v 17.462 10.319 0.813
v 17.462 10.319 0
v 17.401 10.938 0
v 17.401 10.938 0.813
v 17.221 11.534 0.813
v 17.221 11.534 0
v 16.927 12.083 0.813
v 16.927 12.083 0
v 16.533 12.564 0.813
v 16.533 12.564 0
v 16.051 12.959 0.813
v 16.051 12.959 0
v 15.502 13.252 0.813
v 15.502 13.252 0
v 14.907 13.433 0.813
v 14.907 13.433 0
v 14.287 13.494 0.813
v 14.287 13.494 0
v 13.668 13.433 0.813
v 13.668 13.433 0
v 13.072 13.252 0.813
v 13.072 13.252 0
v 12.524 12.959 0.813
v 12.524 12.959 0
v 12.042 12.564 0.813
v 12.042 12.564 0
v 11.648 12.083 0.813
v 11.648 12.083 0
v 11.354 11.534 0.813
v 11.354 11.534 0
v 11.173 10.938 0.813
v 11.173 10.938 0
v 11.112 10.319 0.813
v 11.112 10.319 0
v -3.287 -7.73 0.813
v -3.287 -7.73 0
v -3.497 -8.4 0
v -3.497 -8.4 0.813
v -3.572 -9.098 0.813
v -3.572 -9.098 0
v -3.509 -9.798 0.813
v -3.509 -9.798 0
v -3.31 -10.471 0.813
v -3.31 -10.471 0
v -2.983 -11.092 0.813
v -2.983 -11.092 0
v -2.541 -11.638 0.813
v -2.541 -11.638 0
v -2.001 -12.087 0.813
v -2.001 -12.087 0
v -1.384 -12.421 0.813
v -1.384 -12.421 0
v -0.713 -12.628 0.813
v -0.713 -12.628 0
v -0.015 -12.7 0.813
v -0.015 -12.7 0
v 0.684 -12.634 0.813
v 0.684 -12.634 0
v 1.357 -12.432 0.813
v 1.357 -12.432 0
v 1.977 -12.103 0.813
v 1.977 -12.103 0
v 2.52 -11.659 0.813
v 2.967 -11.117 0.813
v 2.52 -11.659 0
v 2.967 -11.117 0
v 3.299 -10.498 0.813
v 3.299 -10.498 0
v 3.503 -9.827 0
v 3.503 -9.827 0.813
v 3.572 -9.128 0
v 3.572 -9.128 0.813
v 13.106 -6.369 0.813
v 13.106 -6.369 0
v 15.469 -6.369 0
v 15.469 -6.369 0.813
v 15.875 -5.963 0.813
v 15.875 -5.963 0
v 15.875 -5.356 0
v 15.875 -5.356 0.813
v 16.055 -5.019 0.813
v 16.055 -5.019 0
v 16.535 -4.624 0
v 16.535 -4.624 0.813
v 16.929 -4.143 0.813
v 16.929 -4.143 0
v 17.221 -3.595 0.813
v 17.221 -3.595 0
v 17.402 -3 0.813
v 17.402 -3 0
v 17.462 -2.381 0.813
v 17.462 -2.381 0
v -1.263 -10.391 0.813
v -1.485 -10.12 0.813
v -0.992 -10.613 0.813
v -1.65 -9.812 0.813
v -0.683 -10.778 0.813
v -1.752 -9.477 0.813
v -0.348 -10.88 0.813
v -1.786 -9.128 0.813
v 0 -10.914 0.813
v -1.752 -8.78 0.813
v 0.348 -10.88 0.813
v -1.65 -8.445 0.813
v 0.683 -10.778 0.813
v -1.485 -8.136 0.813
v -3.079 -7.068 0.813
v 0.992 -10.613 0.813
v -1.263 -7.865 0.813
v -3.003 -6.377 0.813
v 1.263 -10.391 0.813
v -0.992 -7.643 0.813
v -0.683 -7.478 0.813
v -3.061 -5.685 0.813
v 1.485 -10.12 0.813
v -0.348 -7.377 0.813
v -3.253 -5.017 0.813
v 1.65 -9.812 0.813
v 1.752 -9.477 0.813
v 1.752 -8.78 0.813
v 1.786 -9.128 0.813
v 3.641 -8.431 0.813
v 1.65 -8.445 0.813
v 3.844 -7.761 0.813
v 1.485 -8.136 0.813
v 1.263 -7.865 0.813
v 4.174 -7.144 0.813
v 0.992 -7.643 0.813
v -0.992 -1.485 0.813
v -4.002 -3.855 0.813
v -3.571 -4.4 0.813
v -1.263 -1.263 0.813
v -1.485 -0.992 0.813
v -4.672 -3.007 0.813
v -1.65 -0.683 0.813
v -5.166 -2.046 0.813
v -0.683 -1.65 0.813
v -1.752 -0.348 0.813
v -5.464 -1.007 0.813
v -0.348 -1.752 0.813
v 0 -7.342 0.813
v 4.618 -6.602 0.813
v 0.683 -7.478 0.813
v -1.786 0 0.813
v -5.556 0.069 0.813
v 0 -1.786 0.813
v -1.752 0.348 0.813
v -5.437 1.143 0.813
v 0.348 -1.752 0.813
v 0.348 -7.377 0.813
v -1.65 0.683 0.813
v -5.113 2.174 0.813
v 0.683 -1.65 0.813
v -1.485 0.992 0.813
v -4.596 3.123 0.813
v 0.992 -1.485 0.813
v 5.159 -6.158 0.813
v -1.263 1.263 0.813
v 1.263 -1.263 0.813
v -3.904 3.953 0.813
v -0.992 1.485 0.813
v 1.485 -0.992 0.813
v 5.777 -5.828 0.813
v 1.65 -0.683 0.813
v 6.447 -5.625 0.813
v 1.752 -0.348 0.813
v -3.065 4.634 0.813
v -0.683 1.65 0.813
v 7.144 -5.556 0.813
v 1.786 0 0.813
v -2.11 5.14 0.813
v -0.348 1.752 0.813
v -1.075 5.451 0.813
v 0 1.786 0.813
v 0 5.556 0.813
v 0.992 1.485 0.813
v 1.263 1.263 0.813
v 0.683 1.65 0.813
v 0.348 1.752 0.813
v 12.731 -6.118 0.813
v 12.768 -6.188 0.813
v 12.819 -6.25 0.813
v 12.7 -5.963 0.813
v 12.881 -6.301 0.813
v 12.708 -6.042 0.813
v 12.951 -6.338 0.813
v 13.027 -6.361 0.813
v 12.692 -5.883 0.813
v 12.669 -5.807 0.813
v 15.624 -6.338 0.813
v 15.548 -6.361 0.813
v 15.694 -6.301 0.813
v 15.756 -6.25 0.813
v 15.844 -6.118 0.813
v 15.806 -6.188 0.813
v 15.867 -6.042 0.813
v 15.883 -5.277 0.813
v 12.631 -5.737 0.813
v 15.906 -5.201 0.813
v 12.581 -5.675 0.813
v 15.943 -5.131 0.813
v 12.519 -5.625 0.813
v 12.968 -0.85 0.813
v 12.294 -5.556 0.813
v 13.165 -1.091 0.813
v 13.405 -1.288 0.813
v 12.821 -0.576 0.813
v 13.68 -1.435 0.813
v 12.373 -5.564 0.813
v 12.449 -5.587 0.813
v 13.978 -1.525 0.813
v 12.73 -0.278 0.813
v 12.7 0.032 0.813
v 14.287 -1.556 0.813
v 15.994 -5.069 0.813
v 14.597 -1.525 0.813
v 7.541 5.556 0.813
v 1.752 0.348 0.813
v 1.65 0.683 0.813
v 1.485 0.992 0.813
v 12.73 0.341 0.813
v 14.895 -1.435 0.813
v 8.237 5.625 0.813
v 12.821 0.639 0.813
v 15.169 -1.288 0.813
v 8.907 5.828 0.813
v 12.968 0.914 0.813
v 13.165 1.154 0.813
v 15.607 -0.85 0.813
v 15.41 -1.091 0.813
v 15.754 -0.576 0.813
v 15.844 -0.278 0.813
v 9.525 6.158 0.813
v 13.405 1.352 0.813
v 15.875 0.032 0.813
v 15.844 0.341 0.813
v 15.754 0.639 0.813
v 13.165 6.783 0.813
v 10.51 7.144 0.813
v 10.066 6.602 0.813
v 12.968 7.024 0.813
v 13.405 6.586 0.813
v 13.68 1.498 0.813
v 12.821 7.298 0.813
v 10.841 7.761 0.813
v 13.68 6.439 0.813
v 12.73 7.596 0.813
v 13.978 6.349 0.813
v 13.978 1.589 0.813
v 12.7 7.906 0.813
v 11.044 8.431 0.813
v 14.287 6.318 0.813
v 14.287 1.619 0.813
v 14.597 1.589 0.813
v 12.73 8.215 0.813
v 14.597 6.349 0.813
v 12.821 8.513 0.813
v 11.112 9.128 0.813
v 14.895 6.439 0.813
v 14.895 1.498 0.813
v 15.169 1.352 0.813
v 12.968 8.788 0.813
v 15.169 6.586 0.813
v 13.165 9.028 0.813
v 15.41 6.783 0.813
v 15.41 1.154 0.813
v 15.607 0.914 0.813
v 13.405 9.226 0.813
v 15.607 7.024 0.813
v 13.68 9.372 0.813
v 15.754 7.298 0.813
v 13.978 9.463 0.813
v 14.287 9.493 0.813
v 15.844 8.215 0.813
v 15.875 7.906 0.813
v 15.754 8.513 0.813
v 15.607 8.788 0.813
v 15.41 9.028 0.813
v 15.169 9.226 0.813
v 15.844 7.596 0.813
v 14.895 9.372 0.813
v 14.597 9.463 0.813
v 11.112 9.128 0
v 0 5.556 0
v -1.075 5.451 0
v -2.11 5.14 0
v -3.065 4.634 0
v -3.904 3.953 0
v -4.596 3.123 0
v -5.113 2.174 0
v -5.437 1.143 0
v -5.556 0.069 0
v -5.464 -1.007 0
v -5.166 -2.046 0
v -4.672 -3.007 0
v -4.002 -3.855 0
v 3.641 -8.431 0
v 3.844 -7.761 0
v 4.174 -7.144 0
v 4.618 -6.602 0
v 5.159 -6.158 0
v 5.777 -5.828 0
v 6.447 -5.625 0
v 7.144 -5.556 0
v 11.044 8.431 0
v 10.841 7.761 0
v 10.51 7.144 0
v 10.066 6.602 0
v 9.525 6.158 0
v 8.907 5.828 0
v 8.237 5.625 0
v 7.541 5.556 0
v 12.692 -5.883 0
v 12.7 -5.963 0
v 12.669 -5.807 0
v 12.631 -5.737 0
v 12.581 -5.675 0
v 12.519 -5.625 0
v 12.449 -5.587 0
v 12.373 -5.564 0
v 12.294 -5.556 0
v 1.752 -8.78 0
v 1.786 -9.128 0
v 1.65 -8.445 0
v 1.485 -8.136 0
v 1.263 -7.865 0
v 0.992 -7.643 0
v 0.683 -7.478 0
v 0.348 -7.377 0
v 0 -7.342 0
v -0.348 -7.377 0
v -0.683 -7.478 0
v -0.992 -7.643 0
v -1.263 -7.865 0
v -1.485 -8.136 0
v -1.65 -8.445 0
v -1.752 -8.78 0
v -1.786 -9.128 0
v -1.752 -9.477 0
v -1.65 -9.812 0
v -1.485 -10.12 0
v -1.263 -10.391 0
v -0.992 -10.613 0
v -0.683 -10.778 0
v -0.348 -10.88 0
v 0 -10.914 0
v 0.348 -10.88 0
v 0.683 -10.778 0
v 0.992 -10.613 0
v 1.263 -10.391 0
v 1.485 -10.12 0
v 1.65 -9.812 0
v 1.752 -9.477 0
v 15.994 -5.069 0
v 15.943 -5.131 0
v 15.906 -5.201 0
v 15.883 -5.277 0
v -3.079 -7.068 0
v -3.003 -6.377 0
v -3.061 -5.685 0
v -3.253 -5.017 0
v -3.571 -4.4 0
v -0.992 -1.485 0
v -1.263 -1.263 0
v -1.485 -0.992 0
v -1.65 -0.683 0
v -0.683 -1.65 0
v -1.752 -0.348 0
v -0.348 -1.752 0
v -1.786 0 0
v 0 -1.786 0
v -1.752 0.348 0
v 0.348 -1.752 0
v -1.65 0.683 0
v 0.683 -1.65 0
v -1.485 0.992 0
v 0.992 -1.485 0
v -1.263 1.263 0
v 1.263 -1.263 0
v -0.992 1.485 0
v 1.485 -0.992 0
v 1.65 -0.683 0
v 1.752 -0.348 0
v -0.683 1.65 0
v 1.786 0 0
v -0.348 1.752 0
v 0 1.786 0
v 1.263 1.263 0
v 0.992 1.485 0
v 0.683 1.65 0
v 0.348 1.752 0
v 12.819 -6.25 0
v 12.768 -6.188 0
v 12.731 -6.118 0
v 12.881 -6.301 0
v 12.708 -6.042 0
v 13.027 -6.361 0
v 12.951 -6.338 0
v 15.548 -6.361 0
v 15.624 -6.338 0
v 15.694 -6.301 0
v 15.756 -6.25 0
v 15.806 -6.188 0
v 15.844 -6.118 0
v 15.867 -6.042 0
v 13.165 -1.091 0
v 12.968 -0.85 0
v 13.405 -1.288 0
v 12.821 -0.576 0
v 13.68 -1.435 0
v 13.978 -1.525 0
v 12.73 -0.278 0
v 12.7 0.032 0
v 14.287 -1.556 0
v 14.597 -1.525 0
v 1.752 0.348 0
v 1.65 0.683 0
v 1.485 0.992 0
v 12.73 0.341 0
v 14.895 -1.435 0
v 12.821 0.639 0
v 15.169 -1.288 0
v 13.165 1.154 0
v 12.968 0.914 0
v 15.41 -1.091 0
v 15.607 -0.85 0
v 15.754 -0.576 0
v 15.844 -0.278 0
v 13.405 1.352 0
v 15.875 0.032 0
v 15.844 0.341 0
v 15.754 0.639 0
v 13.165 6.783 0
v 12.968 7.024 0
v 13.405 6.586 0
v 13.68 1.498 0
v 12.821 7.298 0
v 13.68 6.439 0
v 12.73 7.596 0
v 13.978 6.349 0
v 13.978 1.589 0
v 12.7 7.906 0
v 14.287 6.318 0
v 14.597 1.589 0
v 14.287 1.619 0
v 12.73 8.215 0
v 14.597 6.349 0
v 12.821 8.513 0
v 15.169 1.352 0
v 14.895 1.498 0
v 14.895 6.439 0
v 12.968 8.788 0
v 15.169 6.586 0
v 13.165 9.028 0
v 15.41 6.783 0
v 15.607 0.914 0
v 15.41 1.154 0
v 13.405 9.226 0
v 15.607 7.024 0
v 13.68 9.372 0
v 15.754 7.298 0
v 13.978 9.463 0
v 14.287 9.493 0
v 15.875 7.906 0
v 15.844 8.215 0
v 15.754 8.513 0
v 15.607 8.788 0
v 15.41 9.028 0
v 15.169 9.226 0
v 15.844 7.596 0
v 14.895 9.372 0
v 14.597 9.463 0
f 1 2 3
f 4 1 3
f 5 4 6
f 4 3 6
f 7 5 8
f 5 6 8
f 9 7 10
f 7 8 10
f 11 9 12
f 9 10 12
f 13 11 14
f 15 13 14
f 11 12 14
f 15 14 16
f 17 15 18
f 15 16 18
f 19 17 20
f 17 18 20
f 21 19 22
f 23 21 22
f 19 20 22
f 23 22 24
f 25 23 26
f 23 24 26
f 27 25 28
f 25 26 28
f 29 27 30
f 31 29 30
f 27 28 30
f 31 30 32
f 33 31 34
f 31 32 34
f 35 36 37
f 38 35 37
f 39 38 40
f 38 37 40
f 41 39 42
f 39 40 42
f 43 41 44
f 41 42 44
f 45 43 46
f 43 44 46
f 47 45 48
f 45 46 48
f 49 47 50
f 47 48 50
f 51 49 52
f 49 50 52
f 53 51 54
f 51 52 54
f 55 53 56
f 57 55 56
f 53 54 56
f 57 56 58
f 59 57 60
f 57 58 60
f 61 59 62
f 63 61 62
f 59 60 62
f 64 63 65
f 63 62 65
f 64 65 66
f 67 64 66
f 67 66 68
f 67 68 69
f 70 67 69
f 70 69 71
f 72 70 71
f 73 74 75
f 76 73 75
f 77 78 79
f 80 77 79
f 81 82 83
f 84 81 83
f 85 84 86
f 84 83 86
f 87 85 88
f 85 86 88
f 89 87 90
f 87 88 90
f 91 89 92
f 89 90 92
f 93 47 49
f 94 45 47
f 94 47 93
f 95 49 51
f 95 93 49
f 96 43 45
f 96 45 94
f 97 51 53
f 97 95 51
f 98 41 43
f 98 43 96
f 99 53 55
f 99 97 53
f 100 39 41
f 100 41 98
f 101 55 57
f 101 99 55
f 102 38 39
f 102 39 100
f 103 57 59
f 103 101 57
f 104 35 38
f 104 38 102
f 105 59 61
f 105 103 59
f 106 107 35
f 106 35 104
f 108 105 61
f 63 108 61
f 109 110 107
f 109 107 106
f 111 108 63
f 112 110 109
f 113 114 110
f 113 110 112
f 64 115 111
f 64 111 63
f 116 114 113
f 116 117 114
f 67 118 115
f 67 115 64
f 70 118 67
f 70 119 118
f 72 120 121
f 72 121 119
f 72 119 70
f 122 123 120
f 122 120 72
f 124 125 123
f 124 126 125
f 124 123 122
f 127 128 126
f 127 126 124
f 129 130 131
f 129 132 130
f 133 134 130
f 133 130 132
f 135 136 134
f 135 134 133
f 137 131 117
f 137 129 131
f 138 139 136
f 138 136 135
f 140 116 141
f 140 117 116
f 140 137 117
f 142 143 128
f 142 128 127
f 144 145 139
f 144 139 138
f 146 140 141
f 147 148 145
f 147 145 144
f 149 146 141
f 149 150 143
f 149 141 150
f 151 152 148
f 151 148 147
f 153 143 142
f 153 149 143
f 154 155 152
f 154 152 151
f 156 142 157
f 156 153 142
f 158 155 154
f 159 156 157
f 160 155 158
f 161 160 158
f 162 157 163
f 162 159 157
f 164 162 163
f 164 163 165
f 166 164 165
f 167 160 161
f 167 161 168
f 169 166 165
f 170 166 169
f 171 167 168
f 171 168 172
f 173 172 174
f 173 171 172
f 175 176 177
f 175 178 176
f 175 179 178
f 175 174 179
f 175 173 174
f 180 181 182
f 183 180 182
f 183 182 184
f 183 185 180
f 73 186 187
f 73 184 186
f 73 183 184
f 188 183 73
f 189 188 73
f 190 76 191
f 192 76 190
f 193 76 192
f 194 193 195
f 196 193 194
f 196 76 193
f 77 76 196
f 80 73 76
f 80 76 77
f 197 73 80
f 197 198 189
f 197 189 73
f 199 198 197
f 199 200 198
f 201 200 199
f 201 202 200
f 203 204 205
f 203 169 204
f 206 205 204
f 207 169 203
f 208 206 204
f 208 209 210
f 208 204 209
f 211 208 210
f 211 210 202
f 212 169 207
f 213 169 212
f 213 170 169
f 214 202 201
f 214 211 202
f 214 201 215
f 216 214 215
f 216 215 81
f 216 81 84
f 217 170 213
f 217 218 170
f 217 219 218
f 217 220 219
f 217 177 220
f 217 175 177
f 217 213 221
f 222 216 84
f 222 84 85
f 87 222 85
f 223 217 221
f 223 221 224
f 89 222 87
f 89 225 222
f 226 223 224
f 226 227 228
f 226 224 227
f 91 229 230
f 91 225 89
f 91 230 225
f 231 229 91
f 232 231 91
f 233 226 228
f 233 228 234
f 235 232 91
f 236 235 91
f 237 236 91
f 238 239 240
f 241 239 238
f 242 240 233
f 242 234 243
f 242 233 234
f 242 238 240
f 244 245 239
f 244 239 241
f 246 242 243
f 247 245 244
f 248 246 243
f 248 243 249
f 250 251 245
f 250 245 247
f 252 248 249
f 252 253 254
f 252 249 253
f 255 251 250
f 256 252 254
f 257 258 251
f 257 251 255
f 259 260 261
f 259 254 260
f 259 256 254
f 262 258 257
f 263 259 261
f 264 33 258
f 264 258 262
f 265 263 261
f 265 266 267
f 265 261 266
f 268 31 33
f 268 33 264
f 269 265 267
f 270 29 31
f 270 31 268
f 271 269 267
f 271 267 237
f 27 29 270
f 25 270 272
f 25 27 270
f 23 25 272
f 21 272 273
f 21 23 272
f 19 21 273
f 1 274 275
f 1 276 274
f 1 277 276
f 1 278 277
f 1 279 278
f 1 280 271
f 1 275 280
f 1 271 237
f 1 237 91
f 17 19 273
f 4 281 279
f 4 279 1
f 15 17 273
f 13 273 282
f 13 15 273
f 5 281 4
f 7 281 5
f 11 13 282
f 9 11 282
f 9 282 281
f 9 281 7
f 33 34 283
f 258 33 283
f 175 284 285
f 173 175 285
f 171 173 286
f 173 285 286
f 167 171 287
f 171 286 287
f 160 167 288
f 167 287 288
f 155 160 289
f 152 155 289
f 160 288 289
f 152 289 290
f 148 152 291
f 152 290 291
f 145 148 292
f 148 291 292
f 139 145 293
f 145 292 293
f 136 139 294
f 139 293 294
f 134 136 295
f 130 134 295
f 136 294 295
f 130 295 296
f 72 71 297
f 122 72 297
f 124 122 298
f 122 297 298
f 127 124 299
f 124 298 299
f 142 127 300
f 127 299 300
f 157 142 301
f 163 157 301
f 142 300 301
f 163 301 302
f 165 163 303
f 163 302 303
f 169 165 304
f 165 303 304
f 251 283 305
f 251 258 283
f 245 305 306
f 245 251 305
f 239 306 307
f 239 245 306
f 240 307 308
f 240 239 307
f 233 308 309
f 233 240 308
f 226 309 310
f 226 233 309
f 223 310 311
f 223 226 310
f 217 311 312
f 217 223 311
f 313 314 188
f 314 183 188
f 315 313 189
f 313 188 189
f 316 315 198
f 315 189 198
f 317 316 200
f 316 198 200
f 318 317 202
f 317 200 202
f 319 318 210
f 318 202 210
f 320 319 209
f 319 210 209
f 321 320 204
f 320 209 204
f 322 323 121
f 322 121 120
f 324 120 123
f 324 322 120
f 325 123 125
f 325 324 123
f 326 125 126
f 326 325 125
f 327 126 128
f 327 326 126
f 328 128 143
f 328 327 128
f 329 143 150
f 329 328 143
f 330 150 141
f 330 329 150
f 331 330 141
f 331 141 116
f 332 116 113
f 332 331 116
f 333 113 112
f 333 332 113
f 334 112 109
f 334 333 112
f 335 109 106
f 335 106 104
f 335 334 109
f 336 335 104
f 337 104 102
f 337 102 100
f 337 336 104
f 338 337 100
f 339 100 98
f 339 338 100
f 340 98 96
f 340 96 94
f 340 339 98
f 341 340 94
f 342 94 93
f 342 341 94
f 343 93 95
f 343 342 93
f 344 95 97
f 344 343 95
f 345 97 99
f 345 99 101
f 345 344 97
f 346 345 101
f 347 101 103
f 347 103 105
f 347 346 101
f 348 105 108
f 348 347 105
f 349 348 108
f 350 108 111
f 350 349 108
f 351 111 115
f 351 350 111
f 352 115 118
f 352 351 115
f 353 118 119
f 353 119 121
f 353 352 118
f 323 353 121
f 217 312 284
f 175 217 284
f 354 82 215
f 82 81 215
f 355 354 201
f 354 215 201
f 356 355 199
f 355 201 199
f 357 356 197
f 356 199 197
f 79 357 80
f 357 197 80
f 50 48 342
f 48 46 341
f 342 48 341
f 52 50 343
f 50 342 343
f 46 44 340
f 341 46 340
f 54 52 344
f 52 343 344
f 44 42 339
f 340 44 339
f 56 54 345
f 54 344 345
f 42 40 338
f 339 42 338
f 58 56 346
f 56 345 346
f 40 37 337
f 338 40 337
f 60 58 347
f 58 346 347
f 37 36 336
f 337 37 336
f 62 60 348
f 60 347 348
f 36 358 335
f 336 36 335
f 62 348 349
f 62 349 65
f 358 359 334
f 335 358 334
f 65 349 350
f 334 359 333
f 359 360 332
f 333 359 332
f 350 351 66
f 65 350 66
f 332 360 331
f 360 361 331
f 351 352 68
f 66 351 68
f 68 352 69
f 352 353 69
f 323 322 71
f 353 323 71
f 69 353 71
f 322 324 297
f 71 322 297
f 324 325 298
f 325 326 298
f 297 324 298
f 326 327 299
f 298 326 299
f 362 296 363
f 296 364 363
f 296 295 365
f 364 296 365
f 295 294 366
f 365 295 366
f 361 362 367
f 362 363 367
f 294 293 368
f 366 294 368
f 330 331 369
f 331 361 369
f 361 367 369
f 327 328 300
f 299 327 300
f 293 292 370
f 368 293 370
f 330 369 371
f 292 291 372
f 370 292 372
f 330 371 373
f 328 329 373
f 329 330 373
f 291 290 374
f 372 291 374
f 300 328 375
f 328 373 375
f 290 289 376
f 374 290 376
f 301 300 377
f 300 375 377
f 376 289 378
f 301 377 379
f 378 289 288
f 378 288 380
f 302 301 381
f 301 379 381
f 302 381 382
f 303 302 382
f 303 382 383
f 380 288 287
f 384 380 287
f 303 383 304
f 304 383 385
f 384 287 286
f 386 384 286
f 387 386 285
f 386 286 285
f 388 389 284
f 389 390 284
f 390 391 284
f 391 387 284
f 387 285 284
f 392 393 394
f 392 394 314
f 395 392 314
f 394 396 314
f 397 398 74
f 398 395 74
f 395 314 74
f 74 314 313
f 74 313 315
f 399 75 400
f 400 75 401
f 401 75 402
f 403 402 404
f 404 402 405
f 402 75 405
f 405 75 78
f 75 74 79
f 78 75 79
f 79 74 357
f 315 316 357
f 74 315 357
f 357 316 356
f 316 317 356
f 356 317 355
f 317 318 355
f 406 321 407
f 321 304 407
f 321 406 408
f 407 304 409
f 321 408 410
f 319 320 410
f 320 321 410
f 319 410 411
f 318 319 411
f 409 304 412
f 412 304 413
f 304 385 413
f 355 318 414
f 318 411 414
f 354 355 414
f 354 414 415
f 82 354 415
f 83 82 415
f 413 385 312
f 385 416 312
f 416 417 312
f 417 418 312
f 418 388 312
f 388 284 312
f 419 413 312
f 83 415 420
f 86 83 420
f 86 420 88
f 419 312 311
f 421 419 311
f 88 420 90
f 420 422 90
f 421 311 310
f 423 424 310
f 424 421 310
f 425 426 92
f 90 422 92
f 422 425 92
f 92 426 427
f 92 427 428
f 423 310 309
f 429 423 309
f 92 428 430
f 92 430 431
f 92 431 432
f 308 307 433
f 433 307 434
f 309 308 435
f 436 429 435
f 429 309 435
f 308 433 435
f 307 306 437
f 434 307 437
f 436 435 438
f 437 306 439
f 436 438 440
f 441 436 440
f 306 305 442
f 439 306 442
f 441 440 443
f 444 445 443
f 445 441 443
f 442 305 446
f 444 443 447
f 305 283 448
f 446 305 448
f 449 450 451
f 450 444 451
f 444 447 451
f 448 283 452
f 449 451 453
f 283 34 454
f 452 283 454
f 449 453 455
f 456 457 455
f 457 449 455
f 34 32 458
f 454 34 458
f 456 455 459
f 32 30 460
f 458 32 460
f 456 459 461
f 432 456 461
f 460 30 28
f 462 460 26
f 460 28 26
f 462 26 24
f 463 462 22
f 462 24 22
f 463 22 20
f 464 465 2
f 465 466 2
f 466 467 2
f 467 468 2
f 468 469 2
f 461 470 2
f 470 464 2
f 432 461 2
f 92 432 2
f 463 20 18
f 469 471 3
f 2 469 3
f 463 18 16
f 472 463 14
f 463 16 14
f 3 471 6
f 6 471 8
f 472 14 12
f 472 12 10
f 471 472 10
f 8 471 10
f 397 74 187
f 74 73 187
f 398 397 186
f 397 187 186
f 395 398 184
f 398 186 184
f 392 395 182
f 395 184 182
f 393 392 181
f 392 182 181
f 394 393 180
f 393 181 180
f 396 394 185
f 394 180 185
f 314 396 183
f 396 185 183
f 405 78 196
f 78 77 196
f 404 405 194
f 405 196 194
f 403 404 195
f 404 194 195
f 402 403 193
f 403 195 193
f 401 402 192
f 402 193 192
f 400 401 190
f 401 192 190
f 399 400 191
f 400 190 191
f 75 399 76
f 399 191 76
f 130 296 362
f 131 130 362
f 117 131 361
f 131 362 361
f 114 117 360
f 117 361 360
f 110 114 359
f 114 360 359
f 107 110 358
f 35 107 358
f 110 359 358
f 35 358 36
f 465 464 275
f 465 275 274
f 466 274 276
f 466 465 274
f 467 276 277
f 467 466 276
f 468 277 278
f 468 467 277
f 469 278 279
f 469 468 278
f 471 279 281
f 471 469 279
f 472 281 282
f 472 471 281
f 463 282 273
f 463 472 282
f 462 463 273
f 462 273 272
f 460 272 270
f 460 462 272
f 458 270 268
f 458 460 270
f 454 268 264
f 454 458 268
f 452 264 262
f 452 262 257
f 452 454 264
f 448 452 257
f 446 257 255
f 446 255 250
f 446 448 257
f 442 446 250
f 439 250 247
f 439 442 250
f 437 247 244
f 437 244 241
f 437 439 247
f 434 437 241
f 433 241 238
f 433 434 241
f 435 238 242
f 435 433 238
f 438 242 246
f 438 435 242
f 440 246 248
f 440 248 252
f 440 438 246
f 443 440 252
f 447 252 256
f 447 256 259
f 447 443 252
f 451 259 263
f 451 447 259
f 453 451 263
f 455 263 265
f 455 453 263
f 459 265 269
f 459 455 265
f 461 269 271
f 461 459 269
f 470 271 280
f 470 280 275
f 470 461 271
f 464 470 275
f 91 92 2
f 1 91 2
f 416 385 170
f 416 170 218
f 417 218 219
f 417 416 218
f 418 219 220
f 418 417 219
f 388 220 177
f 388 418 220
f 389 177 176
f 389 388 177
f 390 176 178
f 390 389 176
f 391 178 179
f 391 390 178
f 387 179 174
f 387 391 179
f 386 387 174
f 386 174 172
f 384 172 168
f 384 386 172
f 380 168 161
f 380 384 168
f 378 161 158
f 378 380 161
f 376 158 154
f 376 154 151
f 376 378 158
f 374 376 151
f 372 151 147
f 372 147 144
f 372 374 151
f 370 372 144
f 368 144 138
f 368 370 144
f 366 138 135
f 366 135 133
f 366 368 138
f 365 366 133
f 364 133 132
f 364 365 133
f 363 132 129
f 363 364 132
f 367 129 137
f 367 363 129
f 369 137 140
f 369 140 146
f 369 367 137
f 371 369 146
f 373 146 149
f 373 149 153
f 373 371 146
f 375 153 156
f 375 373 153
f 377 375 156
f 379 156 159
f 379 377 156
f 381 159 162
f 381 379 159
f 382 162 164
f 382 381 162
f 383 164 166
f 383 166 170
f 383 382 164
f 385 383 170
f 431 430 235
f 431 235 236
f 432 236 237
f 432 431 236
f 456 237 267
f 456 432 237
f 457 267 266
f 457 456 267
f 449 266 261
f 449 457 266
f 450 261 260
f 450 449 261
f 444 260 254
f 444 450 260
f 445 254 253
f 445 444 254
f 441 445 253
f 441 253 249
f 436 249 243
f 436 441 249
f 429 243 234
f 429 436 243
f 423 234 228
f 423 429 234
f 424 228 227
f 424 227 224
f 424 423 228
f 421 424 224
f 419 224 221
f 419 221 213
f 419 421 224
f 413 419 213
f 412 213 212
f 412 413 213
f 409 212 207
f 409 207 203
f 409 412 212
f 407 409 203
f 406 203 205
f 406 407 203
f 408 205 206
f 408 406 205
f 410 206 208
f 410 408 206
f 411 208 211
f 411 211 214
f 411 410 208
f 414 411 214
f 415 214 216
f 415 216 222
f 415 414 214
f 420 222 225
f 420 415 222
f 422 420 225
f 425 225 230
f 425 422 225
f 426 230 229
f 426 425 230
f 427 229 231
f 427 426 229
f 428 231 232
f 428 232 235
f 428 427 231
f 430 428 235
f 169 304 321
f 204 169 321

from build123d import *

# Parameters (mm, degrees)
SKETCH1_R           = 1.5875
SKETCH1_R_2         = 1.7859375
BOSS_EXTRUDE1_DEPTH = 0.8128
FILLET1_R           = 0.4064
FILLET2_R           = 3.571875


with BuildPart() as part:
    # Sketch1 → Boss-Extrude1 (new body)
    with BuildSketch(Plane.XY):
        with BuildLine():
            ThreePointArc((17.462464722, 10.31875), (14.287464722, 13.49375), (11.112464722, 10.31875))
            Line((11.112464722, 10.31875), (11.112464722, 5.55625))
            Line((11.112464722, 5.55625), (0, 5.55625))
            ThreePointArc((0, 5.55625), (-5.113201992, 2.17418478), (-4.001636336, -3.854714088))
            ThreePointArc((-4.001636336, -3.854714088), (-3.061446663, -5.6851033), (-3.287058398, -7.730434724))
            ThreePointArc((-3.287058398, -7.730434724), (-0.713207299, -12.628071623), (3.571875, -9.128125))
            ThreePointArc((3.571875, -9.128125), (4.61805296, -6.602427972), (7.143749984, -5.55625))
            Line((7.143749984, -5.55625), (12.699964722, -5.55625))
            Line((12.699964722, -5.55625), (12.699964722, -6.36905))
            Line((12.699964722, -6.36905), (15.874964722, -6.36905))
            Line((15.874964722, -6.36905), (15.874964722, -5.130880657))
            ThreePointArc((15.874964722, -5.130880657), (17.037095379, -3.96875), (17.462464722, -2.38125))
            Line((17.462464722, -2.38125), (17.462464722, 10.31875))
        make_face()
        with Locations((14.287464722, 0.03175)):
            Circle(SKETCH1_R, mode=Mode.SUBTRACT)
        with Locations((14.287464722, 7.90575)):
            Circle(SKETCH1_R, mode=Mode.SUBTRACT)
        Circle(SKETCH1_R_2, mode=Mode.SUBTRACT)
        with Locations((0, -9.128125)):
            Circle(SKETCH1_R_2, mode=Mode.SUBTRACT)
    extrude(amount=BOSS_EXTRUDE1_DEPTH)

    # Fillet1
    fillet1_edges = [part.edges().sort_by_distance(p)[0] for p in [
        (15.874964722, -5.130880657, 0.4064),
        (15.874964722, -6.36905, 0.4064),
        (12.699964722, -5.55625, 0.4064),
        (12.699964722, -6.36905, 0.4064),
    ]]
    fillet(fillet1_edges, radius=FILLET1_R - 0.0001)  # a hair under: the kernel refuses the full size

    # Fillet2
    fillet2_edges = [part.edges().sort_by_distance(p)[0] for p in [
        (11.112464722, 5.55625, 0.4064),
    ]]
    fillet(fillet2_edges, radius=FILLET2_R)


solid = part.part
